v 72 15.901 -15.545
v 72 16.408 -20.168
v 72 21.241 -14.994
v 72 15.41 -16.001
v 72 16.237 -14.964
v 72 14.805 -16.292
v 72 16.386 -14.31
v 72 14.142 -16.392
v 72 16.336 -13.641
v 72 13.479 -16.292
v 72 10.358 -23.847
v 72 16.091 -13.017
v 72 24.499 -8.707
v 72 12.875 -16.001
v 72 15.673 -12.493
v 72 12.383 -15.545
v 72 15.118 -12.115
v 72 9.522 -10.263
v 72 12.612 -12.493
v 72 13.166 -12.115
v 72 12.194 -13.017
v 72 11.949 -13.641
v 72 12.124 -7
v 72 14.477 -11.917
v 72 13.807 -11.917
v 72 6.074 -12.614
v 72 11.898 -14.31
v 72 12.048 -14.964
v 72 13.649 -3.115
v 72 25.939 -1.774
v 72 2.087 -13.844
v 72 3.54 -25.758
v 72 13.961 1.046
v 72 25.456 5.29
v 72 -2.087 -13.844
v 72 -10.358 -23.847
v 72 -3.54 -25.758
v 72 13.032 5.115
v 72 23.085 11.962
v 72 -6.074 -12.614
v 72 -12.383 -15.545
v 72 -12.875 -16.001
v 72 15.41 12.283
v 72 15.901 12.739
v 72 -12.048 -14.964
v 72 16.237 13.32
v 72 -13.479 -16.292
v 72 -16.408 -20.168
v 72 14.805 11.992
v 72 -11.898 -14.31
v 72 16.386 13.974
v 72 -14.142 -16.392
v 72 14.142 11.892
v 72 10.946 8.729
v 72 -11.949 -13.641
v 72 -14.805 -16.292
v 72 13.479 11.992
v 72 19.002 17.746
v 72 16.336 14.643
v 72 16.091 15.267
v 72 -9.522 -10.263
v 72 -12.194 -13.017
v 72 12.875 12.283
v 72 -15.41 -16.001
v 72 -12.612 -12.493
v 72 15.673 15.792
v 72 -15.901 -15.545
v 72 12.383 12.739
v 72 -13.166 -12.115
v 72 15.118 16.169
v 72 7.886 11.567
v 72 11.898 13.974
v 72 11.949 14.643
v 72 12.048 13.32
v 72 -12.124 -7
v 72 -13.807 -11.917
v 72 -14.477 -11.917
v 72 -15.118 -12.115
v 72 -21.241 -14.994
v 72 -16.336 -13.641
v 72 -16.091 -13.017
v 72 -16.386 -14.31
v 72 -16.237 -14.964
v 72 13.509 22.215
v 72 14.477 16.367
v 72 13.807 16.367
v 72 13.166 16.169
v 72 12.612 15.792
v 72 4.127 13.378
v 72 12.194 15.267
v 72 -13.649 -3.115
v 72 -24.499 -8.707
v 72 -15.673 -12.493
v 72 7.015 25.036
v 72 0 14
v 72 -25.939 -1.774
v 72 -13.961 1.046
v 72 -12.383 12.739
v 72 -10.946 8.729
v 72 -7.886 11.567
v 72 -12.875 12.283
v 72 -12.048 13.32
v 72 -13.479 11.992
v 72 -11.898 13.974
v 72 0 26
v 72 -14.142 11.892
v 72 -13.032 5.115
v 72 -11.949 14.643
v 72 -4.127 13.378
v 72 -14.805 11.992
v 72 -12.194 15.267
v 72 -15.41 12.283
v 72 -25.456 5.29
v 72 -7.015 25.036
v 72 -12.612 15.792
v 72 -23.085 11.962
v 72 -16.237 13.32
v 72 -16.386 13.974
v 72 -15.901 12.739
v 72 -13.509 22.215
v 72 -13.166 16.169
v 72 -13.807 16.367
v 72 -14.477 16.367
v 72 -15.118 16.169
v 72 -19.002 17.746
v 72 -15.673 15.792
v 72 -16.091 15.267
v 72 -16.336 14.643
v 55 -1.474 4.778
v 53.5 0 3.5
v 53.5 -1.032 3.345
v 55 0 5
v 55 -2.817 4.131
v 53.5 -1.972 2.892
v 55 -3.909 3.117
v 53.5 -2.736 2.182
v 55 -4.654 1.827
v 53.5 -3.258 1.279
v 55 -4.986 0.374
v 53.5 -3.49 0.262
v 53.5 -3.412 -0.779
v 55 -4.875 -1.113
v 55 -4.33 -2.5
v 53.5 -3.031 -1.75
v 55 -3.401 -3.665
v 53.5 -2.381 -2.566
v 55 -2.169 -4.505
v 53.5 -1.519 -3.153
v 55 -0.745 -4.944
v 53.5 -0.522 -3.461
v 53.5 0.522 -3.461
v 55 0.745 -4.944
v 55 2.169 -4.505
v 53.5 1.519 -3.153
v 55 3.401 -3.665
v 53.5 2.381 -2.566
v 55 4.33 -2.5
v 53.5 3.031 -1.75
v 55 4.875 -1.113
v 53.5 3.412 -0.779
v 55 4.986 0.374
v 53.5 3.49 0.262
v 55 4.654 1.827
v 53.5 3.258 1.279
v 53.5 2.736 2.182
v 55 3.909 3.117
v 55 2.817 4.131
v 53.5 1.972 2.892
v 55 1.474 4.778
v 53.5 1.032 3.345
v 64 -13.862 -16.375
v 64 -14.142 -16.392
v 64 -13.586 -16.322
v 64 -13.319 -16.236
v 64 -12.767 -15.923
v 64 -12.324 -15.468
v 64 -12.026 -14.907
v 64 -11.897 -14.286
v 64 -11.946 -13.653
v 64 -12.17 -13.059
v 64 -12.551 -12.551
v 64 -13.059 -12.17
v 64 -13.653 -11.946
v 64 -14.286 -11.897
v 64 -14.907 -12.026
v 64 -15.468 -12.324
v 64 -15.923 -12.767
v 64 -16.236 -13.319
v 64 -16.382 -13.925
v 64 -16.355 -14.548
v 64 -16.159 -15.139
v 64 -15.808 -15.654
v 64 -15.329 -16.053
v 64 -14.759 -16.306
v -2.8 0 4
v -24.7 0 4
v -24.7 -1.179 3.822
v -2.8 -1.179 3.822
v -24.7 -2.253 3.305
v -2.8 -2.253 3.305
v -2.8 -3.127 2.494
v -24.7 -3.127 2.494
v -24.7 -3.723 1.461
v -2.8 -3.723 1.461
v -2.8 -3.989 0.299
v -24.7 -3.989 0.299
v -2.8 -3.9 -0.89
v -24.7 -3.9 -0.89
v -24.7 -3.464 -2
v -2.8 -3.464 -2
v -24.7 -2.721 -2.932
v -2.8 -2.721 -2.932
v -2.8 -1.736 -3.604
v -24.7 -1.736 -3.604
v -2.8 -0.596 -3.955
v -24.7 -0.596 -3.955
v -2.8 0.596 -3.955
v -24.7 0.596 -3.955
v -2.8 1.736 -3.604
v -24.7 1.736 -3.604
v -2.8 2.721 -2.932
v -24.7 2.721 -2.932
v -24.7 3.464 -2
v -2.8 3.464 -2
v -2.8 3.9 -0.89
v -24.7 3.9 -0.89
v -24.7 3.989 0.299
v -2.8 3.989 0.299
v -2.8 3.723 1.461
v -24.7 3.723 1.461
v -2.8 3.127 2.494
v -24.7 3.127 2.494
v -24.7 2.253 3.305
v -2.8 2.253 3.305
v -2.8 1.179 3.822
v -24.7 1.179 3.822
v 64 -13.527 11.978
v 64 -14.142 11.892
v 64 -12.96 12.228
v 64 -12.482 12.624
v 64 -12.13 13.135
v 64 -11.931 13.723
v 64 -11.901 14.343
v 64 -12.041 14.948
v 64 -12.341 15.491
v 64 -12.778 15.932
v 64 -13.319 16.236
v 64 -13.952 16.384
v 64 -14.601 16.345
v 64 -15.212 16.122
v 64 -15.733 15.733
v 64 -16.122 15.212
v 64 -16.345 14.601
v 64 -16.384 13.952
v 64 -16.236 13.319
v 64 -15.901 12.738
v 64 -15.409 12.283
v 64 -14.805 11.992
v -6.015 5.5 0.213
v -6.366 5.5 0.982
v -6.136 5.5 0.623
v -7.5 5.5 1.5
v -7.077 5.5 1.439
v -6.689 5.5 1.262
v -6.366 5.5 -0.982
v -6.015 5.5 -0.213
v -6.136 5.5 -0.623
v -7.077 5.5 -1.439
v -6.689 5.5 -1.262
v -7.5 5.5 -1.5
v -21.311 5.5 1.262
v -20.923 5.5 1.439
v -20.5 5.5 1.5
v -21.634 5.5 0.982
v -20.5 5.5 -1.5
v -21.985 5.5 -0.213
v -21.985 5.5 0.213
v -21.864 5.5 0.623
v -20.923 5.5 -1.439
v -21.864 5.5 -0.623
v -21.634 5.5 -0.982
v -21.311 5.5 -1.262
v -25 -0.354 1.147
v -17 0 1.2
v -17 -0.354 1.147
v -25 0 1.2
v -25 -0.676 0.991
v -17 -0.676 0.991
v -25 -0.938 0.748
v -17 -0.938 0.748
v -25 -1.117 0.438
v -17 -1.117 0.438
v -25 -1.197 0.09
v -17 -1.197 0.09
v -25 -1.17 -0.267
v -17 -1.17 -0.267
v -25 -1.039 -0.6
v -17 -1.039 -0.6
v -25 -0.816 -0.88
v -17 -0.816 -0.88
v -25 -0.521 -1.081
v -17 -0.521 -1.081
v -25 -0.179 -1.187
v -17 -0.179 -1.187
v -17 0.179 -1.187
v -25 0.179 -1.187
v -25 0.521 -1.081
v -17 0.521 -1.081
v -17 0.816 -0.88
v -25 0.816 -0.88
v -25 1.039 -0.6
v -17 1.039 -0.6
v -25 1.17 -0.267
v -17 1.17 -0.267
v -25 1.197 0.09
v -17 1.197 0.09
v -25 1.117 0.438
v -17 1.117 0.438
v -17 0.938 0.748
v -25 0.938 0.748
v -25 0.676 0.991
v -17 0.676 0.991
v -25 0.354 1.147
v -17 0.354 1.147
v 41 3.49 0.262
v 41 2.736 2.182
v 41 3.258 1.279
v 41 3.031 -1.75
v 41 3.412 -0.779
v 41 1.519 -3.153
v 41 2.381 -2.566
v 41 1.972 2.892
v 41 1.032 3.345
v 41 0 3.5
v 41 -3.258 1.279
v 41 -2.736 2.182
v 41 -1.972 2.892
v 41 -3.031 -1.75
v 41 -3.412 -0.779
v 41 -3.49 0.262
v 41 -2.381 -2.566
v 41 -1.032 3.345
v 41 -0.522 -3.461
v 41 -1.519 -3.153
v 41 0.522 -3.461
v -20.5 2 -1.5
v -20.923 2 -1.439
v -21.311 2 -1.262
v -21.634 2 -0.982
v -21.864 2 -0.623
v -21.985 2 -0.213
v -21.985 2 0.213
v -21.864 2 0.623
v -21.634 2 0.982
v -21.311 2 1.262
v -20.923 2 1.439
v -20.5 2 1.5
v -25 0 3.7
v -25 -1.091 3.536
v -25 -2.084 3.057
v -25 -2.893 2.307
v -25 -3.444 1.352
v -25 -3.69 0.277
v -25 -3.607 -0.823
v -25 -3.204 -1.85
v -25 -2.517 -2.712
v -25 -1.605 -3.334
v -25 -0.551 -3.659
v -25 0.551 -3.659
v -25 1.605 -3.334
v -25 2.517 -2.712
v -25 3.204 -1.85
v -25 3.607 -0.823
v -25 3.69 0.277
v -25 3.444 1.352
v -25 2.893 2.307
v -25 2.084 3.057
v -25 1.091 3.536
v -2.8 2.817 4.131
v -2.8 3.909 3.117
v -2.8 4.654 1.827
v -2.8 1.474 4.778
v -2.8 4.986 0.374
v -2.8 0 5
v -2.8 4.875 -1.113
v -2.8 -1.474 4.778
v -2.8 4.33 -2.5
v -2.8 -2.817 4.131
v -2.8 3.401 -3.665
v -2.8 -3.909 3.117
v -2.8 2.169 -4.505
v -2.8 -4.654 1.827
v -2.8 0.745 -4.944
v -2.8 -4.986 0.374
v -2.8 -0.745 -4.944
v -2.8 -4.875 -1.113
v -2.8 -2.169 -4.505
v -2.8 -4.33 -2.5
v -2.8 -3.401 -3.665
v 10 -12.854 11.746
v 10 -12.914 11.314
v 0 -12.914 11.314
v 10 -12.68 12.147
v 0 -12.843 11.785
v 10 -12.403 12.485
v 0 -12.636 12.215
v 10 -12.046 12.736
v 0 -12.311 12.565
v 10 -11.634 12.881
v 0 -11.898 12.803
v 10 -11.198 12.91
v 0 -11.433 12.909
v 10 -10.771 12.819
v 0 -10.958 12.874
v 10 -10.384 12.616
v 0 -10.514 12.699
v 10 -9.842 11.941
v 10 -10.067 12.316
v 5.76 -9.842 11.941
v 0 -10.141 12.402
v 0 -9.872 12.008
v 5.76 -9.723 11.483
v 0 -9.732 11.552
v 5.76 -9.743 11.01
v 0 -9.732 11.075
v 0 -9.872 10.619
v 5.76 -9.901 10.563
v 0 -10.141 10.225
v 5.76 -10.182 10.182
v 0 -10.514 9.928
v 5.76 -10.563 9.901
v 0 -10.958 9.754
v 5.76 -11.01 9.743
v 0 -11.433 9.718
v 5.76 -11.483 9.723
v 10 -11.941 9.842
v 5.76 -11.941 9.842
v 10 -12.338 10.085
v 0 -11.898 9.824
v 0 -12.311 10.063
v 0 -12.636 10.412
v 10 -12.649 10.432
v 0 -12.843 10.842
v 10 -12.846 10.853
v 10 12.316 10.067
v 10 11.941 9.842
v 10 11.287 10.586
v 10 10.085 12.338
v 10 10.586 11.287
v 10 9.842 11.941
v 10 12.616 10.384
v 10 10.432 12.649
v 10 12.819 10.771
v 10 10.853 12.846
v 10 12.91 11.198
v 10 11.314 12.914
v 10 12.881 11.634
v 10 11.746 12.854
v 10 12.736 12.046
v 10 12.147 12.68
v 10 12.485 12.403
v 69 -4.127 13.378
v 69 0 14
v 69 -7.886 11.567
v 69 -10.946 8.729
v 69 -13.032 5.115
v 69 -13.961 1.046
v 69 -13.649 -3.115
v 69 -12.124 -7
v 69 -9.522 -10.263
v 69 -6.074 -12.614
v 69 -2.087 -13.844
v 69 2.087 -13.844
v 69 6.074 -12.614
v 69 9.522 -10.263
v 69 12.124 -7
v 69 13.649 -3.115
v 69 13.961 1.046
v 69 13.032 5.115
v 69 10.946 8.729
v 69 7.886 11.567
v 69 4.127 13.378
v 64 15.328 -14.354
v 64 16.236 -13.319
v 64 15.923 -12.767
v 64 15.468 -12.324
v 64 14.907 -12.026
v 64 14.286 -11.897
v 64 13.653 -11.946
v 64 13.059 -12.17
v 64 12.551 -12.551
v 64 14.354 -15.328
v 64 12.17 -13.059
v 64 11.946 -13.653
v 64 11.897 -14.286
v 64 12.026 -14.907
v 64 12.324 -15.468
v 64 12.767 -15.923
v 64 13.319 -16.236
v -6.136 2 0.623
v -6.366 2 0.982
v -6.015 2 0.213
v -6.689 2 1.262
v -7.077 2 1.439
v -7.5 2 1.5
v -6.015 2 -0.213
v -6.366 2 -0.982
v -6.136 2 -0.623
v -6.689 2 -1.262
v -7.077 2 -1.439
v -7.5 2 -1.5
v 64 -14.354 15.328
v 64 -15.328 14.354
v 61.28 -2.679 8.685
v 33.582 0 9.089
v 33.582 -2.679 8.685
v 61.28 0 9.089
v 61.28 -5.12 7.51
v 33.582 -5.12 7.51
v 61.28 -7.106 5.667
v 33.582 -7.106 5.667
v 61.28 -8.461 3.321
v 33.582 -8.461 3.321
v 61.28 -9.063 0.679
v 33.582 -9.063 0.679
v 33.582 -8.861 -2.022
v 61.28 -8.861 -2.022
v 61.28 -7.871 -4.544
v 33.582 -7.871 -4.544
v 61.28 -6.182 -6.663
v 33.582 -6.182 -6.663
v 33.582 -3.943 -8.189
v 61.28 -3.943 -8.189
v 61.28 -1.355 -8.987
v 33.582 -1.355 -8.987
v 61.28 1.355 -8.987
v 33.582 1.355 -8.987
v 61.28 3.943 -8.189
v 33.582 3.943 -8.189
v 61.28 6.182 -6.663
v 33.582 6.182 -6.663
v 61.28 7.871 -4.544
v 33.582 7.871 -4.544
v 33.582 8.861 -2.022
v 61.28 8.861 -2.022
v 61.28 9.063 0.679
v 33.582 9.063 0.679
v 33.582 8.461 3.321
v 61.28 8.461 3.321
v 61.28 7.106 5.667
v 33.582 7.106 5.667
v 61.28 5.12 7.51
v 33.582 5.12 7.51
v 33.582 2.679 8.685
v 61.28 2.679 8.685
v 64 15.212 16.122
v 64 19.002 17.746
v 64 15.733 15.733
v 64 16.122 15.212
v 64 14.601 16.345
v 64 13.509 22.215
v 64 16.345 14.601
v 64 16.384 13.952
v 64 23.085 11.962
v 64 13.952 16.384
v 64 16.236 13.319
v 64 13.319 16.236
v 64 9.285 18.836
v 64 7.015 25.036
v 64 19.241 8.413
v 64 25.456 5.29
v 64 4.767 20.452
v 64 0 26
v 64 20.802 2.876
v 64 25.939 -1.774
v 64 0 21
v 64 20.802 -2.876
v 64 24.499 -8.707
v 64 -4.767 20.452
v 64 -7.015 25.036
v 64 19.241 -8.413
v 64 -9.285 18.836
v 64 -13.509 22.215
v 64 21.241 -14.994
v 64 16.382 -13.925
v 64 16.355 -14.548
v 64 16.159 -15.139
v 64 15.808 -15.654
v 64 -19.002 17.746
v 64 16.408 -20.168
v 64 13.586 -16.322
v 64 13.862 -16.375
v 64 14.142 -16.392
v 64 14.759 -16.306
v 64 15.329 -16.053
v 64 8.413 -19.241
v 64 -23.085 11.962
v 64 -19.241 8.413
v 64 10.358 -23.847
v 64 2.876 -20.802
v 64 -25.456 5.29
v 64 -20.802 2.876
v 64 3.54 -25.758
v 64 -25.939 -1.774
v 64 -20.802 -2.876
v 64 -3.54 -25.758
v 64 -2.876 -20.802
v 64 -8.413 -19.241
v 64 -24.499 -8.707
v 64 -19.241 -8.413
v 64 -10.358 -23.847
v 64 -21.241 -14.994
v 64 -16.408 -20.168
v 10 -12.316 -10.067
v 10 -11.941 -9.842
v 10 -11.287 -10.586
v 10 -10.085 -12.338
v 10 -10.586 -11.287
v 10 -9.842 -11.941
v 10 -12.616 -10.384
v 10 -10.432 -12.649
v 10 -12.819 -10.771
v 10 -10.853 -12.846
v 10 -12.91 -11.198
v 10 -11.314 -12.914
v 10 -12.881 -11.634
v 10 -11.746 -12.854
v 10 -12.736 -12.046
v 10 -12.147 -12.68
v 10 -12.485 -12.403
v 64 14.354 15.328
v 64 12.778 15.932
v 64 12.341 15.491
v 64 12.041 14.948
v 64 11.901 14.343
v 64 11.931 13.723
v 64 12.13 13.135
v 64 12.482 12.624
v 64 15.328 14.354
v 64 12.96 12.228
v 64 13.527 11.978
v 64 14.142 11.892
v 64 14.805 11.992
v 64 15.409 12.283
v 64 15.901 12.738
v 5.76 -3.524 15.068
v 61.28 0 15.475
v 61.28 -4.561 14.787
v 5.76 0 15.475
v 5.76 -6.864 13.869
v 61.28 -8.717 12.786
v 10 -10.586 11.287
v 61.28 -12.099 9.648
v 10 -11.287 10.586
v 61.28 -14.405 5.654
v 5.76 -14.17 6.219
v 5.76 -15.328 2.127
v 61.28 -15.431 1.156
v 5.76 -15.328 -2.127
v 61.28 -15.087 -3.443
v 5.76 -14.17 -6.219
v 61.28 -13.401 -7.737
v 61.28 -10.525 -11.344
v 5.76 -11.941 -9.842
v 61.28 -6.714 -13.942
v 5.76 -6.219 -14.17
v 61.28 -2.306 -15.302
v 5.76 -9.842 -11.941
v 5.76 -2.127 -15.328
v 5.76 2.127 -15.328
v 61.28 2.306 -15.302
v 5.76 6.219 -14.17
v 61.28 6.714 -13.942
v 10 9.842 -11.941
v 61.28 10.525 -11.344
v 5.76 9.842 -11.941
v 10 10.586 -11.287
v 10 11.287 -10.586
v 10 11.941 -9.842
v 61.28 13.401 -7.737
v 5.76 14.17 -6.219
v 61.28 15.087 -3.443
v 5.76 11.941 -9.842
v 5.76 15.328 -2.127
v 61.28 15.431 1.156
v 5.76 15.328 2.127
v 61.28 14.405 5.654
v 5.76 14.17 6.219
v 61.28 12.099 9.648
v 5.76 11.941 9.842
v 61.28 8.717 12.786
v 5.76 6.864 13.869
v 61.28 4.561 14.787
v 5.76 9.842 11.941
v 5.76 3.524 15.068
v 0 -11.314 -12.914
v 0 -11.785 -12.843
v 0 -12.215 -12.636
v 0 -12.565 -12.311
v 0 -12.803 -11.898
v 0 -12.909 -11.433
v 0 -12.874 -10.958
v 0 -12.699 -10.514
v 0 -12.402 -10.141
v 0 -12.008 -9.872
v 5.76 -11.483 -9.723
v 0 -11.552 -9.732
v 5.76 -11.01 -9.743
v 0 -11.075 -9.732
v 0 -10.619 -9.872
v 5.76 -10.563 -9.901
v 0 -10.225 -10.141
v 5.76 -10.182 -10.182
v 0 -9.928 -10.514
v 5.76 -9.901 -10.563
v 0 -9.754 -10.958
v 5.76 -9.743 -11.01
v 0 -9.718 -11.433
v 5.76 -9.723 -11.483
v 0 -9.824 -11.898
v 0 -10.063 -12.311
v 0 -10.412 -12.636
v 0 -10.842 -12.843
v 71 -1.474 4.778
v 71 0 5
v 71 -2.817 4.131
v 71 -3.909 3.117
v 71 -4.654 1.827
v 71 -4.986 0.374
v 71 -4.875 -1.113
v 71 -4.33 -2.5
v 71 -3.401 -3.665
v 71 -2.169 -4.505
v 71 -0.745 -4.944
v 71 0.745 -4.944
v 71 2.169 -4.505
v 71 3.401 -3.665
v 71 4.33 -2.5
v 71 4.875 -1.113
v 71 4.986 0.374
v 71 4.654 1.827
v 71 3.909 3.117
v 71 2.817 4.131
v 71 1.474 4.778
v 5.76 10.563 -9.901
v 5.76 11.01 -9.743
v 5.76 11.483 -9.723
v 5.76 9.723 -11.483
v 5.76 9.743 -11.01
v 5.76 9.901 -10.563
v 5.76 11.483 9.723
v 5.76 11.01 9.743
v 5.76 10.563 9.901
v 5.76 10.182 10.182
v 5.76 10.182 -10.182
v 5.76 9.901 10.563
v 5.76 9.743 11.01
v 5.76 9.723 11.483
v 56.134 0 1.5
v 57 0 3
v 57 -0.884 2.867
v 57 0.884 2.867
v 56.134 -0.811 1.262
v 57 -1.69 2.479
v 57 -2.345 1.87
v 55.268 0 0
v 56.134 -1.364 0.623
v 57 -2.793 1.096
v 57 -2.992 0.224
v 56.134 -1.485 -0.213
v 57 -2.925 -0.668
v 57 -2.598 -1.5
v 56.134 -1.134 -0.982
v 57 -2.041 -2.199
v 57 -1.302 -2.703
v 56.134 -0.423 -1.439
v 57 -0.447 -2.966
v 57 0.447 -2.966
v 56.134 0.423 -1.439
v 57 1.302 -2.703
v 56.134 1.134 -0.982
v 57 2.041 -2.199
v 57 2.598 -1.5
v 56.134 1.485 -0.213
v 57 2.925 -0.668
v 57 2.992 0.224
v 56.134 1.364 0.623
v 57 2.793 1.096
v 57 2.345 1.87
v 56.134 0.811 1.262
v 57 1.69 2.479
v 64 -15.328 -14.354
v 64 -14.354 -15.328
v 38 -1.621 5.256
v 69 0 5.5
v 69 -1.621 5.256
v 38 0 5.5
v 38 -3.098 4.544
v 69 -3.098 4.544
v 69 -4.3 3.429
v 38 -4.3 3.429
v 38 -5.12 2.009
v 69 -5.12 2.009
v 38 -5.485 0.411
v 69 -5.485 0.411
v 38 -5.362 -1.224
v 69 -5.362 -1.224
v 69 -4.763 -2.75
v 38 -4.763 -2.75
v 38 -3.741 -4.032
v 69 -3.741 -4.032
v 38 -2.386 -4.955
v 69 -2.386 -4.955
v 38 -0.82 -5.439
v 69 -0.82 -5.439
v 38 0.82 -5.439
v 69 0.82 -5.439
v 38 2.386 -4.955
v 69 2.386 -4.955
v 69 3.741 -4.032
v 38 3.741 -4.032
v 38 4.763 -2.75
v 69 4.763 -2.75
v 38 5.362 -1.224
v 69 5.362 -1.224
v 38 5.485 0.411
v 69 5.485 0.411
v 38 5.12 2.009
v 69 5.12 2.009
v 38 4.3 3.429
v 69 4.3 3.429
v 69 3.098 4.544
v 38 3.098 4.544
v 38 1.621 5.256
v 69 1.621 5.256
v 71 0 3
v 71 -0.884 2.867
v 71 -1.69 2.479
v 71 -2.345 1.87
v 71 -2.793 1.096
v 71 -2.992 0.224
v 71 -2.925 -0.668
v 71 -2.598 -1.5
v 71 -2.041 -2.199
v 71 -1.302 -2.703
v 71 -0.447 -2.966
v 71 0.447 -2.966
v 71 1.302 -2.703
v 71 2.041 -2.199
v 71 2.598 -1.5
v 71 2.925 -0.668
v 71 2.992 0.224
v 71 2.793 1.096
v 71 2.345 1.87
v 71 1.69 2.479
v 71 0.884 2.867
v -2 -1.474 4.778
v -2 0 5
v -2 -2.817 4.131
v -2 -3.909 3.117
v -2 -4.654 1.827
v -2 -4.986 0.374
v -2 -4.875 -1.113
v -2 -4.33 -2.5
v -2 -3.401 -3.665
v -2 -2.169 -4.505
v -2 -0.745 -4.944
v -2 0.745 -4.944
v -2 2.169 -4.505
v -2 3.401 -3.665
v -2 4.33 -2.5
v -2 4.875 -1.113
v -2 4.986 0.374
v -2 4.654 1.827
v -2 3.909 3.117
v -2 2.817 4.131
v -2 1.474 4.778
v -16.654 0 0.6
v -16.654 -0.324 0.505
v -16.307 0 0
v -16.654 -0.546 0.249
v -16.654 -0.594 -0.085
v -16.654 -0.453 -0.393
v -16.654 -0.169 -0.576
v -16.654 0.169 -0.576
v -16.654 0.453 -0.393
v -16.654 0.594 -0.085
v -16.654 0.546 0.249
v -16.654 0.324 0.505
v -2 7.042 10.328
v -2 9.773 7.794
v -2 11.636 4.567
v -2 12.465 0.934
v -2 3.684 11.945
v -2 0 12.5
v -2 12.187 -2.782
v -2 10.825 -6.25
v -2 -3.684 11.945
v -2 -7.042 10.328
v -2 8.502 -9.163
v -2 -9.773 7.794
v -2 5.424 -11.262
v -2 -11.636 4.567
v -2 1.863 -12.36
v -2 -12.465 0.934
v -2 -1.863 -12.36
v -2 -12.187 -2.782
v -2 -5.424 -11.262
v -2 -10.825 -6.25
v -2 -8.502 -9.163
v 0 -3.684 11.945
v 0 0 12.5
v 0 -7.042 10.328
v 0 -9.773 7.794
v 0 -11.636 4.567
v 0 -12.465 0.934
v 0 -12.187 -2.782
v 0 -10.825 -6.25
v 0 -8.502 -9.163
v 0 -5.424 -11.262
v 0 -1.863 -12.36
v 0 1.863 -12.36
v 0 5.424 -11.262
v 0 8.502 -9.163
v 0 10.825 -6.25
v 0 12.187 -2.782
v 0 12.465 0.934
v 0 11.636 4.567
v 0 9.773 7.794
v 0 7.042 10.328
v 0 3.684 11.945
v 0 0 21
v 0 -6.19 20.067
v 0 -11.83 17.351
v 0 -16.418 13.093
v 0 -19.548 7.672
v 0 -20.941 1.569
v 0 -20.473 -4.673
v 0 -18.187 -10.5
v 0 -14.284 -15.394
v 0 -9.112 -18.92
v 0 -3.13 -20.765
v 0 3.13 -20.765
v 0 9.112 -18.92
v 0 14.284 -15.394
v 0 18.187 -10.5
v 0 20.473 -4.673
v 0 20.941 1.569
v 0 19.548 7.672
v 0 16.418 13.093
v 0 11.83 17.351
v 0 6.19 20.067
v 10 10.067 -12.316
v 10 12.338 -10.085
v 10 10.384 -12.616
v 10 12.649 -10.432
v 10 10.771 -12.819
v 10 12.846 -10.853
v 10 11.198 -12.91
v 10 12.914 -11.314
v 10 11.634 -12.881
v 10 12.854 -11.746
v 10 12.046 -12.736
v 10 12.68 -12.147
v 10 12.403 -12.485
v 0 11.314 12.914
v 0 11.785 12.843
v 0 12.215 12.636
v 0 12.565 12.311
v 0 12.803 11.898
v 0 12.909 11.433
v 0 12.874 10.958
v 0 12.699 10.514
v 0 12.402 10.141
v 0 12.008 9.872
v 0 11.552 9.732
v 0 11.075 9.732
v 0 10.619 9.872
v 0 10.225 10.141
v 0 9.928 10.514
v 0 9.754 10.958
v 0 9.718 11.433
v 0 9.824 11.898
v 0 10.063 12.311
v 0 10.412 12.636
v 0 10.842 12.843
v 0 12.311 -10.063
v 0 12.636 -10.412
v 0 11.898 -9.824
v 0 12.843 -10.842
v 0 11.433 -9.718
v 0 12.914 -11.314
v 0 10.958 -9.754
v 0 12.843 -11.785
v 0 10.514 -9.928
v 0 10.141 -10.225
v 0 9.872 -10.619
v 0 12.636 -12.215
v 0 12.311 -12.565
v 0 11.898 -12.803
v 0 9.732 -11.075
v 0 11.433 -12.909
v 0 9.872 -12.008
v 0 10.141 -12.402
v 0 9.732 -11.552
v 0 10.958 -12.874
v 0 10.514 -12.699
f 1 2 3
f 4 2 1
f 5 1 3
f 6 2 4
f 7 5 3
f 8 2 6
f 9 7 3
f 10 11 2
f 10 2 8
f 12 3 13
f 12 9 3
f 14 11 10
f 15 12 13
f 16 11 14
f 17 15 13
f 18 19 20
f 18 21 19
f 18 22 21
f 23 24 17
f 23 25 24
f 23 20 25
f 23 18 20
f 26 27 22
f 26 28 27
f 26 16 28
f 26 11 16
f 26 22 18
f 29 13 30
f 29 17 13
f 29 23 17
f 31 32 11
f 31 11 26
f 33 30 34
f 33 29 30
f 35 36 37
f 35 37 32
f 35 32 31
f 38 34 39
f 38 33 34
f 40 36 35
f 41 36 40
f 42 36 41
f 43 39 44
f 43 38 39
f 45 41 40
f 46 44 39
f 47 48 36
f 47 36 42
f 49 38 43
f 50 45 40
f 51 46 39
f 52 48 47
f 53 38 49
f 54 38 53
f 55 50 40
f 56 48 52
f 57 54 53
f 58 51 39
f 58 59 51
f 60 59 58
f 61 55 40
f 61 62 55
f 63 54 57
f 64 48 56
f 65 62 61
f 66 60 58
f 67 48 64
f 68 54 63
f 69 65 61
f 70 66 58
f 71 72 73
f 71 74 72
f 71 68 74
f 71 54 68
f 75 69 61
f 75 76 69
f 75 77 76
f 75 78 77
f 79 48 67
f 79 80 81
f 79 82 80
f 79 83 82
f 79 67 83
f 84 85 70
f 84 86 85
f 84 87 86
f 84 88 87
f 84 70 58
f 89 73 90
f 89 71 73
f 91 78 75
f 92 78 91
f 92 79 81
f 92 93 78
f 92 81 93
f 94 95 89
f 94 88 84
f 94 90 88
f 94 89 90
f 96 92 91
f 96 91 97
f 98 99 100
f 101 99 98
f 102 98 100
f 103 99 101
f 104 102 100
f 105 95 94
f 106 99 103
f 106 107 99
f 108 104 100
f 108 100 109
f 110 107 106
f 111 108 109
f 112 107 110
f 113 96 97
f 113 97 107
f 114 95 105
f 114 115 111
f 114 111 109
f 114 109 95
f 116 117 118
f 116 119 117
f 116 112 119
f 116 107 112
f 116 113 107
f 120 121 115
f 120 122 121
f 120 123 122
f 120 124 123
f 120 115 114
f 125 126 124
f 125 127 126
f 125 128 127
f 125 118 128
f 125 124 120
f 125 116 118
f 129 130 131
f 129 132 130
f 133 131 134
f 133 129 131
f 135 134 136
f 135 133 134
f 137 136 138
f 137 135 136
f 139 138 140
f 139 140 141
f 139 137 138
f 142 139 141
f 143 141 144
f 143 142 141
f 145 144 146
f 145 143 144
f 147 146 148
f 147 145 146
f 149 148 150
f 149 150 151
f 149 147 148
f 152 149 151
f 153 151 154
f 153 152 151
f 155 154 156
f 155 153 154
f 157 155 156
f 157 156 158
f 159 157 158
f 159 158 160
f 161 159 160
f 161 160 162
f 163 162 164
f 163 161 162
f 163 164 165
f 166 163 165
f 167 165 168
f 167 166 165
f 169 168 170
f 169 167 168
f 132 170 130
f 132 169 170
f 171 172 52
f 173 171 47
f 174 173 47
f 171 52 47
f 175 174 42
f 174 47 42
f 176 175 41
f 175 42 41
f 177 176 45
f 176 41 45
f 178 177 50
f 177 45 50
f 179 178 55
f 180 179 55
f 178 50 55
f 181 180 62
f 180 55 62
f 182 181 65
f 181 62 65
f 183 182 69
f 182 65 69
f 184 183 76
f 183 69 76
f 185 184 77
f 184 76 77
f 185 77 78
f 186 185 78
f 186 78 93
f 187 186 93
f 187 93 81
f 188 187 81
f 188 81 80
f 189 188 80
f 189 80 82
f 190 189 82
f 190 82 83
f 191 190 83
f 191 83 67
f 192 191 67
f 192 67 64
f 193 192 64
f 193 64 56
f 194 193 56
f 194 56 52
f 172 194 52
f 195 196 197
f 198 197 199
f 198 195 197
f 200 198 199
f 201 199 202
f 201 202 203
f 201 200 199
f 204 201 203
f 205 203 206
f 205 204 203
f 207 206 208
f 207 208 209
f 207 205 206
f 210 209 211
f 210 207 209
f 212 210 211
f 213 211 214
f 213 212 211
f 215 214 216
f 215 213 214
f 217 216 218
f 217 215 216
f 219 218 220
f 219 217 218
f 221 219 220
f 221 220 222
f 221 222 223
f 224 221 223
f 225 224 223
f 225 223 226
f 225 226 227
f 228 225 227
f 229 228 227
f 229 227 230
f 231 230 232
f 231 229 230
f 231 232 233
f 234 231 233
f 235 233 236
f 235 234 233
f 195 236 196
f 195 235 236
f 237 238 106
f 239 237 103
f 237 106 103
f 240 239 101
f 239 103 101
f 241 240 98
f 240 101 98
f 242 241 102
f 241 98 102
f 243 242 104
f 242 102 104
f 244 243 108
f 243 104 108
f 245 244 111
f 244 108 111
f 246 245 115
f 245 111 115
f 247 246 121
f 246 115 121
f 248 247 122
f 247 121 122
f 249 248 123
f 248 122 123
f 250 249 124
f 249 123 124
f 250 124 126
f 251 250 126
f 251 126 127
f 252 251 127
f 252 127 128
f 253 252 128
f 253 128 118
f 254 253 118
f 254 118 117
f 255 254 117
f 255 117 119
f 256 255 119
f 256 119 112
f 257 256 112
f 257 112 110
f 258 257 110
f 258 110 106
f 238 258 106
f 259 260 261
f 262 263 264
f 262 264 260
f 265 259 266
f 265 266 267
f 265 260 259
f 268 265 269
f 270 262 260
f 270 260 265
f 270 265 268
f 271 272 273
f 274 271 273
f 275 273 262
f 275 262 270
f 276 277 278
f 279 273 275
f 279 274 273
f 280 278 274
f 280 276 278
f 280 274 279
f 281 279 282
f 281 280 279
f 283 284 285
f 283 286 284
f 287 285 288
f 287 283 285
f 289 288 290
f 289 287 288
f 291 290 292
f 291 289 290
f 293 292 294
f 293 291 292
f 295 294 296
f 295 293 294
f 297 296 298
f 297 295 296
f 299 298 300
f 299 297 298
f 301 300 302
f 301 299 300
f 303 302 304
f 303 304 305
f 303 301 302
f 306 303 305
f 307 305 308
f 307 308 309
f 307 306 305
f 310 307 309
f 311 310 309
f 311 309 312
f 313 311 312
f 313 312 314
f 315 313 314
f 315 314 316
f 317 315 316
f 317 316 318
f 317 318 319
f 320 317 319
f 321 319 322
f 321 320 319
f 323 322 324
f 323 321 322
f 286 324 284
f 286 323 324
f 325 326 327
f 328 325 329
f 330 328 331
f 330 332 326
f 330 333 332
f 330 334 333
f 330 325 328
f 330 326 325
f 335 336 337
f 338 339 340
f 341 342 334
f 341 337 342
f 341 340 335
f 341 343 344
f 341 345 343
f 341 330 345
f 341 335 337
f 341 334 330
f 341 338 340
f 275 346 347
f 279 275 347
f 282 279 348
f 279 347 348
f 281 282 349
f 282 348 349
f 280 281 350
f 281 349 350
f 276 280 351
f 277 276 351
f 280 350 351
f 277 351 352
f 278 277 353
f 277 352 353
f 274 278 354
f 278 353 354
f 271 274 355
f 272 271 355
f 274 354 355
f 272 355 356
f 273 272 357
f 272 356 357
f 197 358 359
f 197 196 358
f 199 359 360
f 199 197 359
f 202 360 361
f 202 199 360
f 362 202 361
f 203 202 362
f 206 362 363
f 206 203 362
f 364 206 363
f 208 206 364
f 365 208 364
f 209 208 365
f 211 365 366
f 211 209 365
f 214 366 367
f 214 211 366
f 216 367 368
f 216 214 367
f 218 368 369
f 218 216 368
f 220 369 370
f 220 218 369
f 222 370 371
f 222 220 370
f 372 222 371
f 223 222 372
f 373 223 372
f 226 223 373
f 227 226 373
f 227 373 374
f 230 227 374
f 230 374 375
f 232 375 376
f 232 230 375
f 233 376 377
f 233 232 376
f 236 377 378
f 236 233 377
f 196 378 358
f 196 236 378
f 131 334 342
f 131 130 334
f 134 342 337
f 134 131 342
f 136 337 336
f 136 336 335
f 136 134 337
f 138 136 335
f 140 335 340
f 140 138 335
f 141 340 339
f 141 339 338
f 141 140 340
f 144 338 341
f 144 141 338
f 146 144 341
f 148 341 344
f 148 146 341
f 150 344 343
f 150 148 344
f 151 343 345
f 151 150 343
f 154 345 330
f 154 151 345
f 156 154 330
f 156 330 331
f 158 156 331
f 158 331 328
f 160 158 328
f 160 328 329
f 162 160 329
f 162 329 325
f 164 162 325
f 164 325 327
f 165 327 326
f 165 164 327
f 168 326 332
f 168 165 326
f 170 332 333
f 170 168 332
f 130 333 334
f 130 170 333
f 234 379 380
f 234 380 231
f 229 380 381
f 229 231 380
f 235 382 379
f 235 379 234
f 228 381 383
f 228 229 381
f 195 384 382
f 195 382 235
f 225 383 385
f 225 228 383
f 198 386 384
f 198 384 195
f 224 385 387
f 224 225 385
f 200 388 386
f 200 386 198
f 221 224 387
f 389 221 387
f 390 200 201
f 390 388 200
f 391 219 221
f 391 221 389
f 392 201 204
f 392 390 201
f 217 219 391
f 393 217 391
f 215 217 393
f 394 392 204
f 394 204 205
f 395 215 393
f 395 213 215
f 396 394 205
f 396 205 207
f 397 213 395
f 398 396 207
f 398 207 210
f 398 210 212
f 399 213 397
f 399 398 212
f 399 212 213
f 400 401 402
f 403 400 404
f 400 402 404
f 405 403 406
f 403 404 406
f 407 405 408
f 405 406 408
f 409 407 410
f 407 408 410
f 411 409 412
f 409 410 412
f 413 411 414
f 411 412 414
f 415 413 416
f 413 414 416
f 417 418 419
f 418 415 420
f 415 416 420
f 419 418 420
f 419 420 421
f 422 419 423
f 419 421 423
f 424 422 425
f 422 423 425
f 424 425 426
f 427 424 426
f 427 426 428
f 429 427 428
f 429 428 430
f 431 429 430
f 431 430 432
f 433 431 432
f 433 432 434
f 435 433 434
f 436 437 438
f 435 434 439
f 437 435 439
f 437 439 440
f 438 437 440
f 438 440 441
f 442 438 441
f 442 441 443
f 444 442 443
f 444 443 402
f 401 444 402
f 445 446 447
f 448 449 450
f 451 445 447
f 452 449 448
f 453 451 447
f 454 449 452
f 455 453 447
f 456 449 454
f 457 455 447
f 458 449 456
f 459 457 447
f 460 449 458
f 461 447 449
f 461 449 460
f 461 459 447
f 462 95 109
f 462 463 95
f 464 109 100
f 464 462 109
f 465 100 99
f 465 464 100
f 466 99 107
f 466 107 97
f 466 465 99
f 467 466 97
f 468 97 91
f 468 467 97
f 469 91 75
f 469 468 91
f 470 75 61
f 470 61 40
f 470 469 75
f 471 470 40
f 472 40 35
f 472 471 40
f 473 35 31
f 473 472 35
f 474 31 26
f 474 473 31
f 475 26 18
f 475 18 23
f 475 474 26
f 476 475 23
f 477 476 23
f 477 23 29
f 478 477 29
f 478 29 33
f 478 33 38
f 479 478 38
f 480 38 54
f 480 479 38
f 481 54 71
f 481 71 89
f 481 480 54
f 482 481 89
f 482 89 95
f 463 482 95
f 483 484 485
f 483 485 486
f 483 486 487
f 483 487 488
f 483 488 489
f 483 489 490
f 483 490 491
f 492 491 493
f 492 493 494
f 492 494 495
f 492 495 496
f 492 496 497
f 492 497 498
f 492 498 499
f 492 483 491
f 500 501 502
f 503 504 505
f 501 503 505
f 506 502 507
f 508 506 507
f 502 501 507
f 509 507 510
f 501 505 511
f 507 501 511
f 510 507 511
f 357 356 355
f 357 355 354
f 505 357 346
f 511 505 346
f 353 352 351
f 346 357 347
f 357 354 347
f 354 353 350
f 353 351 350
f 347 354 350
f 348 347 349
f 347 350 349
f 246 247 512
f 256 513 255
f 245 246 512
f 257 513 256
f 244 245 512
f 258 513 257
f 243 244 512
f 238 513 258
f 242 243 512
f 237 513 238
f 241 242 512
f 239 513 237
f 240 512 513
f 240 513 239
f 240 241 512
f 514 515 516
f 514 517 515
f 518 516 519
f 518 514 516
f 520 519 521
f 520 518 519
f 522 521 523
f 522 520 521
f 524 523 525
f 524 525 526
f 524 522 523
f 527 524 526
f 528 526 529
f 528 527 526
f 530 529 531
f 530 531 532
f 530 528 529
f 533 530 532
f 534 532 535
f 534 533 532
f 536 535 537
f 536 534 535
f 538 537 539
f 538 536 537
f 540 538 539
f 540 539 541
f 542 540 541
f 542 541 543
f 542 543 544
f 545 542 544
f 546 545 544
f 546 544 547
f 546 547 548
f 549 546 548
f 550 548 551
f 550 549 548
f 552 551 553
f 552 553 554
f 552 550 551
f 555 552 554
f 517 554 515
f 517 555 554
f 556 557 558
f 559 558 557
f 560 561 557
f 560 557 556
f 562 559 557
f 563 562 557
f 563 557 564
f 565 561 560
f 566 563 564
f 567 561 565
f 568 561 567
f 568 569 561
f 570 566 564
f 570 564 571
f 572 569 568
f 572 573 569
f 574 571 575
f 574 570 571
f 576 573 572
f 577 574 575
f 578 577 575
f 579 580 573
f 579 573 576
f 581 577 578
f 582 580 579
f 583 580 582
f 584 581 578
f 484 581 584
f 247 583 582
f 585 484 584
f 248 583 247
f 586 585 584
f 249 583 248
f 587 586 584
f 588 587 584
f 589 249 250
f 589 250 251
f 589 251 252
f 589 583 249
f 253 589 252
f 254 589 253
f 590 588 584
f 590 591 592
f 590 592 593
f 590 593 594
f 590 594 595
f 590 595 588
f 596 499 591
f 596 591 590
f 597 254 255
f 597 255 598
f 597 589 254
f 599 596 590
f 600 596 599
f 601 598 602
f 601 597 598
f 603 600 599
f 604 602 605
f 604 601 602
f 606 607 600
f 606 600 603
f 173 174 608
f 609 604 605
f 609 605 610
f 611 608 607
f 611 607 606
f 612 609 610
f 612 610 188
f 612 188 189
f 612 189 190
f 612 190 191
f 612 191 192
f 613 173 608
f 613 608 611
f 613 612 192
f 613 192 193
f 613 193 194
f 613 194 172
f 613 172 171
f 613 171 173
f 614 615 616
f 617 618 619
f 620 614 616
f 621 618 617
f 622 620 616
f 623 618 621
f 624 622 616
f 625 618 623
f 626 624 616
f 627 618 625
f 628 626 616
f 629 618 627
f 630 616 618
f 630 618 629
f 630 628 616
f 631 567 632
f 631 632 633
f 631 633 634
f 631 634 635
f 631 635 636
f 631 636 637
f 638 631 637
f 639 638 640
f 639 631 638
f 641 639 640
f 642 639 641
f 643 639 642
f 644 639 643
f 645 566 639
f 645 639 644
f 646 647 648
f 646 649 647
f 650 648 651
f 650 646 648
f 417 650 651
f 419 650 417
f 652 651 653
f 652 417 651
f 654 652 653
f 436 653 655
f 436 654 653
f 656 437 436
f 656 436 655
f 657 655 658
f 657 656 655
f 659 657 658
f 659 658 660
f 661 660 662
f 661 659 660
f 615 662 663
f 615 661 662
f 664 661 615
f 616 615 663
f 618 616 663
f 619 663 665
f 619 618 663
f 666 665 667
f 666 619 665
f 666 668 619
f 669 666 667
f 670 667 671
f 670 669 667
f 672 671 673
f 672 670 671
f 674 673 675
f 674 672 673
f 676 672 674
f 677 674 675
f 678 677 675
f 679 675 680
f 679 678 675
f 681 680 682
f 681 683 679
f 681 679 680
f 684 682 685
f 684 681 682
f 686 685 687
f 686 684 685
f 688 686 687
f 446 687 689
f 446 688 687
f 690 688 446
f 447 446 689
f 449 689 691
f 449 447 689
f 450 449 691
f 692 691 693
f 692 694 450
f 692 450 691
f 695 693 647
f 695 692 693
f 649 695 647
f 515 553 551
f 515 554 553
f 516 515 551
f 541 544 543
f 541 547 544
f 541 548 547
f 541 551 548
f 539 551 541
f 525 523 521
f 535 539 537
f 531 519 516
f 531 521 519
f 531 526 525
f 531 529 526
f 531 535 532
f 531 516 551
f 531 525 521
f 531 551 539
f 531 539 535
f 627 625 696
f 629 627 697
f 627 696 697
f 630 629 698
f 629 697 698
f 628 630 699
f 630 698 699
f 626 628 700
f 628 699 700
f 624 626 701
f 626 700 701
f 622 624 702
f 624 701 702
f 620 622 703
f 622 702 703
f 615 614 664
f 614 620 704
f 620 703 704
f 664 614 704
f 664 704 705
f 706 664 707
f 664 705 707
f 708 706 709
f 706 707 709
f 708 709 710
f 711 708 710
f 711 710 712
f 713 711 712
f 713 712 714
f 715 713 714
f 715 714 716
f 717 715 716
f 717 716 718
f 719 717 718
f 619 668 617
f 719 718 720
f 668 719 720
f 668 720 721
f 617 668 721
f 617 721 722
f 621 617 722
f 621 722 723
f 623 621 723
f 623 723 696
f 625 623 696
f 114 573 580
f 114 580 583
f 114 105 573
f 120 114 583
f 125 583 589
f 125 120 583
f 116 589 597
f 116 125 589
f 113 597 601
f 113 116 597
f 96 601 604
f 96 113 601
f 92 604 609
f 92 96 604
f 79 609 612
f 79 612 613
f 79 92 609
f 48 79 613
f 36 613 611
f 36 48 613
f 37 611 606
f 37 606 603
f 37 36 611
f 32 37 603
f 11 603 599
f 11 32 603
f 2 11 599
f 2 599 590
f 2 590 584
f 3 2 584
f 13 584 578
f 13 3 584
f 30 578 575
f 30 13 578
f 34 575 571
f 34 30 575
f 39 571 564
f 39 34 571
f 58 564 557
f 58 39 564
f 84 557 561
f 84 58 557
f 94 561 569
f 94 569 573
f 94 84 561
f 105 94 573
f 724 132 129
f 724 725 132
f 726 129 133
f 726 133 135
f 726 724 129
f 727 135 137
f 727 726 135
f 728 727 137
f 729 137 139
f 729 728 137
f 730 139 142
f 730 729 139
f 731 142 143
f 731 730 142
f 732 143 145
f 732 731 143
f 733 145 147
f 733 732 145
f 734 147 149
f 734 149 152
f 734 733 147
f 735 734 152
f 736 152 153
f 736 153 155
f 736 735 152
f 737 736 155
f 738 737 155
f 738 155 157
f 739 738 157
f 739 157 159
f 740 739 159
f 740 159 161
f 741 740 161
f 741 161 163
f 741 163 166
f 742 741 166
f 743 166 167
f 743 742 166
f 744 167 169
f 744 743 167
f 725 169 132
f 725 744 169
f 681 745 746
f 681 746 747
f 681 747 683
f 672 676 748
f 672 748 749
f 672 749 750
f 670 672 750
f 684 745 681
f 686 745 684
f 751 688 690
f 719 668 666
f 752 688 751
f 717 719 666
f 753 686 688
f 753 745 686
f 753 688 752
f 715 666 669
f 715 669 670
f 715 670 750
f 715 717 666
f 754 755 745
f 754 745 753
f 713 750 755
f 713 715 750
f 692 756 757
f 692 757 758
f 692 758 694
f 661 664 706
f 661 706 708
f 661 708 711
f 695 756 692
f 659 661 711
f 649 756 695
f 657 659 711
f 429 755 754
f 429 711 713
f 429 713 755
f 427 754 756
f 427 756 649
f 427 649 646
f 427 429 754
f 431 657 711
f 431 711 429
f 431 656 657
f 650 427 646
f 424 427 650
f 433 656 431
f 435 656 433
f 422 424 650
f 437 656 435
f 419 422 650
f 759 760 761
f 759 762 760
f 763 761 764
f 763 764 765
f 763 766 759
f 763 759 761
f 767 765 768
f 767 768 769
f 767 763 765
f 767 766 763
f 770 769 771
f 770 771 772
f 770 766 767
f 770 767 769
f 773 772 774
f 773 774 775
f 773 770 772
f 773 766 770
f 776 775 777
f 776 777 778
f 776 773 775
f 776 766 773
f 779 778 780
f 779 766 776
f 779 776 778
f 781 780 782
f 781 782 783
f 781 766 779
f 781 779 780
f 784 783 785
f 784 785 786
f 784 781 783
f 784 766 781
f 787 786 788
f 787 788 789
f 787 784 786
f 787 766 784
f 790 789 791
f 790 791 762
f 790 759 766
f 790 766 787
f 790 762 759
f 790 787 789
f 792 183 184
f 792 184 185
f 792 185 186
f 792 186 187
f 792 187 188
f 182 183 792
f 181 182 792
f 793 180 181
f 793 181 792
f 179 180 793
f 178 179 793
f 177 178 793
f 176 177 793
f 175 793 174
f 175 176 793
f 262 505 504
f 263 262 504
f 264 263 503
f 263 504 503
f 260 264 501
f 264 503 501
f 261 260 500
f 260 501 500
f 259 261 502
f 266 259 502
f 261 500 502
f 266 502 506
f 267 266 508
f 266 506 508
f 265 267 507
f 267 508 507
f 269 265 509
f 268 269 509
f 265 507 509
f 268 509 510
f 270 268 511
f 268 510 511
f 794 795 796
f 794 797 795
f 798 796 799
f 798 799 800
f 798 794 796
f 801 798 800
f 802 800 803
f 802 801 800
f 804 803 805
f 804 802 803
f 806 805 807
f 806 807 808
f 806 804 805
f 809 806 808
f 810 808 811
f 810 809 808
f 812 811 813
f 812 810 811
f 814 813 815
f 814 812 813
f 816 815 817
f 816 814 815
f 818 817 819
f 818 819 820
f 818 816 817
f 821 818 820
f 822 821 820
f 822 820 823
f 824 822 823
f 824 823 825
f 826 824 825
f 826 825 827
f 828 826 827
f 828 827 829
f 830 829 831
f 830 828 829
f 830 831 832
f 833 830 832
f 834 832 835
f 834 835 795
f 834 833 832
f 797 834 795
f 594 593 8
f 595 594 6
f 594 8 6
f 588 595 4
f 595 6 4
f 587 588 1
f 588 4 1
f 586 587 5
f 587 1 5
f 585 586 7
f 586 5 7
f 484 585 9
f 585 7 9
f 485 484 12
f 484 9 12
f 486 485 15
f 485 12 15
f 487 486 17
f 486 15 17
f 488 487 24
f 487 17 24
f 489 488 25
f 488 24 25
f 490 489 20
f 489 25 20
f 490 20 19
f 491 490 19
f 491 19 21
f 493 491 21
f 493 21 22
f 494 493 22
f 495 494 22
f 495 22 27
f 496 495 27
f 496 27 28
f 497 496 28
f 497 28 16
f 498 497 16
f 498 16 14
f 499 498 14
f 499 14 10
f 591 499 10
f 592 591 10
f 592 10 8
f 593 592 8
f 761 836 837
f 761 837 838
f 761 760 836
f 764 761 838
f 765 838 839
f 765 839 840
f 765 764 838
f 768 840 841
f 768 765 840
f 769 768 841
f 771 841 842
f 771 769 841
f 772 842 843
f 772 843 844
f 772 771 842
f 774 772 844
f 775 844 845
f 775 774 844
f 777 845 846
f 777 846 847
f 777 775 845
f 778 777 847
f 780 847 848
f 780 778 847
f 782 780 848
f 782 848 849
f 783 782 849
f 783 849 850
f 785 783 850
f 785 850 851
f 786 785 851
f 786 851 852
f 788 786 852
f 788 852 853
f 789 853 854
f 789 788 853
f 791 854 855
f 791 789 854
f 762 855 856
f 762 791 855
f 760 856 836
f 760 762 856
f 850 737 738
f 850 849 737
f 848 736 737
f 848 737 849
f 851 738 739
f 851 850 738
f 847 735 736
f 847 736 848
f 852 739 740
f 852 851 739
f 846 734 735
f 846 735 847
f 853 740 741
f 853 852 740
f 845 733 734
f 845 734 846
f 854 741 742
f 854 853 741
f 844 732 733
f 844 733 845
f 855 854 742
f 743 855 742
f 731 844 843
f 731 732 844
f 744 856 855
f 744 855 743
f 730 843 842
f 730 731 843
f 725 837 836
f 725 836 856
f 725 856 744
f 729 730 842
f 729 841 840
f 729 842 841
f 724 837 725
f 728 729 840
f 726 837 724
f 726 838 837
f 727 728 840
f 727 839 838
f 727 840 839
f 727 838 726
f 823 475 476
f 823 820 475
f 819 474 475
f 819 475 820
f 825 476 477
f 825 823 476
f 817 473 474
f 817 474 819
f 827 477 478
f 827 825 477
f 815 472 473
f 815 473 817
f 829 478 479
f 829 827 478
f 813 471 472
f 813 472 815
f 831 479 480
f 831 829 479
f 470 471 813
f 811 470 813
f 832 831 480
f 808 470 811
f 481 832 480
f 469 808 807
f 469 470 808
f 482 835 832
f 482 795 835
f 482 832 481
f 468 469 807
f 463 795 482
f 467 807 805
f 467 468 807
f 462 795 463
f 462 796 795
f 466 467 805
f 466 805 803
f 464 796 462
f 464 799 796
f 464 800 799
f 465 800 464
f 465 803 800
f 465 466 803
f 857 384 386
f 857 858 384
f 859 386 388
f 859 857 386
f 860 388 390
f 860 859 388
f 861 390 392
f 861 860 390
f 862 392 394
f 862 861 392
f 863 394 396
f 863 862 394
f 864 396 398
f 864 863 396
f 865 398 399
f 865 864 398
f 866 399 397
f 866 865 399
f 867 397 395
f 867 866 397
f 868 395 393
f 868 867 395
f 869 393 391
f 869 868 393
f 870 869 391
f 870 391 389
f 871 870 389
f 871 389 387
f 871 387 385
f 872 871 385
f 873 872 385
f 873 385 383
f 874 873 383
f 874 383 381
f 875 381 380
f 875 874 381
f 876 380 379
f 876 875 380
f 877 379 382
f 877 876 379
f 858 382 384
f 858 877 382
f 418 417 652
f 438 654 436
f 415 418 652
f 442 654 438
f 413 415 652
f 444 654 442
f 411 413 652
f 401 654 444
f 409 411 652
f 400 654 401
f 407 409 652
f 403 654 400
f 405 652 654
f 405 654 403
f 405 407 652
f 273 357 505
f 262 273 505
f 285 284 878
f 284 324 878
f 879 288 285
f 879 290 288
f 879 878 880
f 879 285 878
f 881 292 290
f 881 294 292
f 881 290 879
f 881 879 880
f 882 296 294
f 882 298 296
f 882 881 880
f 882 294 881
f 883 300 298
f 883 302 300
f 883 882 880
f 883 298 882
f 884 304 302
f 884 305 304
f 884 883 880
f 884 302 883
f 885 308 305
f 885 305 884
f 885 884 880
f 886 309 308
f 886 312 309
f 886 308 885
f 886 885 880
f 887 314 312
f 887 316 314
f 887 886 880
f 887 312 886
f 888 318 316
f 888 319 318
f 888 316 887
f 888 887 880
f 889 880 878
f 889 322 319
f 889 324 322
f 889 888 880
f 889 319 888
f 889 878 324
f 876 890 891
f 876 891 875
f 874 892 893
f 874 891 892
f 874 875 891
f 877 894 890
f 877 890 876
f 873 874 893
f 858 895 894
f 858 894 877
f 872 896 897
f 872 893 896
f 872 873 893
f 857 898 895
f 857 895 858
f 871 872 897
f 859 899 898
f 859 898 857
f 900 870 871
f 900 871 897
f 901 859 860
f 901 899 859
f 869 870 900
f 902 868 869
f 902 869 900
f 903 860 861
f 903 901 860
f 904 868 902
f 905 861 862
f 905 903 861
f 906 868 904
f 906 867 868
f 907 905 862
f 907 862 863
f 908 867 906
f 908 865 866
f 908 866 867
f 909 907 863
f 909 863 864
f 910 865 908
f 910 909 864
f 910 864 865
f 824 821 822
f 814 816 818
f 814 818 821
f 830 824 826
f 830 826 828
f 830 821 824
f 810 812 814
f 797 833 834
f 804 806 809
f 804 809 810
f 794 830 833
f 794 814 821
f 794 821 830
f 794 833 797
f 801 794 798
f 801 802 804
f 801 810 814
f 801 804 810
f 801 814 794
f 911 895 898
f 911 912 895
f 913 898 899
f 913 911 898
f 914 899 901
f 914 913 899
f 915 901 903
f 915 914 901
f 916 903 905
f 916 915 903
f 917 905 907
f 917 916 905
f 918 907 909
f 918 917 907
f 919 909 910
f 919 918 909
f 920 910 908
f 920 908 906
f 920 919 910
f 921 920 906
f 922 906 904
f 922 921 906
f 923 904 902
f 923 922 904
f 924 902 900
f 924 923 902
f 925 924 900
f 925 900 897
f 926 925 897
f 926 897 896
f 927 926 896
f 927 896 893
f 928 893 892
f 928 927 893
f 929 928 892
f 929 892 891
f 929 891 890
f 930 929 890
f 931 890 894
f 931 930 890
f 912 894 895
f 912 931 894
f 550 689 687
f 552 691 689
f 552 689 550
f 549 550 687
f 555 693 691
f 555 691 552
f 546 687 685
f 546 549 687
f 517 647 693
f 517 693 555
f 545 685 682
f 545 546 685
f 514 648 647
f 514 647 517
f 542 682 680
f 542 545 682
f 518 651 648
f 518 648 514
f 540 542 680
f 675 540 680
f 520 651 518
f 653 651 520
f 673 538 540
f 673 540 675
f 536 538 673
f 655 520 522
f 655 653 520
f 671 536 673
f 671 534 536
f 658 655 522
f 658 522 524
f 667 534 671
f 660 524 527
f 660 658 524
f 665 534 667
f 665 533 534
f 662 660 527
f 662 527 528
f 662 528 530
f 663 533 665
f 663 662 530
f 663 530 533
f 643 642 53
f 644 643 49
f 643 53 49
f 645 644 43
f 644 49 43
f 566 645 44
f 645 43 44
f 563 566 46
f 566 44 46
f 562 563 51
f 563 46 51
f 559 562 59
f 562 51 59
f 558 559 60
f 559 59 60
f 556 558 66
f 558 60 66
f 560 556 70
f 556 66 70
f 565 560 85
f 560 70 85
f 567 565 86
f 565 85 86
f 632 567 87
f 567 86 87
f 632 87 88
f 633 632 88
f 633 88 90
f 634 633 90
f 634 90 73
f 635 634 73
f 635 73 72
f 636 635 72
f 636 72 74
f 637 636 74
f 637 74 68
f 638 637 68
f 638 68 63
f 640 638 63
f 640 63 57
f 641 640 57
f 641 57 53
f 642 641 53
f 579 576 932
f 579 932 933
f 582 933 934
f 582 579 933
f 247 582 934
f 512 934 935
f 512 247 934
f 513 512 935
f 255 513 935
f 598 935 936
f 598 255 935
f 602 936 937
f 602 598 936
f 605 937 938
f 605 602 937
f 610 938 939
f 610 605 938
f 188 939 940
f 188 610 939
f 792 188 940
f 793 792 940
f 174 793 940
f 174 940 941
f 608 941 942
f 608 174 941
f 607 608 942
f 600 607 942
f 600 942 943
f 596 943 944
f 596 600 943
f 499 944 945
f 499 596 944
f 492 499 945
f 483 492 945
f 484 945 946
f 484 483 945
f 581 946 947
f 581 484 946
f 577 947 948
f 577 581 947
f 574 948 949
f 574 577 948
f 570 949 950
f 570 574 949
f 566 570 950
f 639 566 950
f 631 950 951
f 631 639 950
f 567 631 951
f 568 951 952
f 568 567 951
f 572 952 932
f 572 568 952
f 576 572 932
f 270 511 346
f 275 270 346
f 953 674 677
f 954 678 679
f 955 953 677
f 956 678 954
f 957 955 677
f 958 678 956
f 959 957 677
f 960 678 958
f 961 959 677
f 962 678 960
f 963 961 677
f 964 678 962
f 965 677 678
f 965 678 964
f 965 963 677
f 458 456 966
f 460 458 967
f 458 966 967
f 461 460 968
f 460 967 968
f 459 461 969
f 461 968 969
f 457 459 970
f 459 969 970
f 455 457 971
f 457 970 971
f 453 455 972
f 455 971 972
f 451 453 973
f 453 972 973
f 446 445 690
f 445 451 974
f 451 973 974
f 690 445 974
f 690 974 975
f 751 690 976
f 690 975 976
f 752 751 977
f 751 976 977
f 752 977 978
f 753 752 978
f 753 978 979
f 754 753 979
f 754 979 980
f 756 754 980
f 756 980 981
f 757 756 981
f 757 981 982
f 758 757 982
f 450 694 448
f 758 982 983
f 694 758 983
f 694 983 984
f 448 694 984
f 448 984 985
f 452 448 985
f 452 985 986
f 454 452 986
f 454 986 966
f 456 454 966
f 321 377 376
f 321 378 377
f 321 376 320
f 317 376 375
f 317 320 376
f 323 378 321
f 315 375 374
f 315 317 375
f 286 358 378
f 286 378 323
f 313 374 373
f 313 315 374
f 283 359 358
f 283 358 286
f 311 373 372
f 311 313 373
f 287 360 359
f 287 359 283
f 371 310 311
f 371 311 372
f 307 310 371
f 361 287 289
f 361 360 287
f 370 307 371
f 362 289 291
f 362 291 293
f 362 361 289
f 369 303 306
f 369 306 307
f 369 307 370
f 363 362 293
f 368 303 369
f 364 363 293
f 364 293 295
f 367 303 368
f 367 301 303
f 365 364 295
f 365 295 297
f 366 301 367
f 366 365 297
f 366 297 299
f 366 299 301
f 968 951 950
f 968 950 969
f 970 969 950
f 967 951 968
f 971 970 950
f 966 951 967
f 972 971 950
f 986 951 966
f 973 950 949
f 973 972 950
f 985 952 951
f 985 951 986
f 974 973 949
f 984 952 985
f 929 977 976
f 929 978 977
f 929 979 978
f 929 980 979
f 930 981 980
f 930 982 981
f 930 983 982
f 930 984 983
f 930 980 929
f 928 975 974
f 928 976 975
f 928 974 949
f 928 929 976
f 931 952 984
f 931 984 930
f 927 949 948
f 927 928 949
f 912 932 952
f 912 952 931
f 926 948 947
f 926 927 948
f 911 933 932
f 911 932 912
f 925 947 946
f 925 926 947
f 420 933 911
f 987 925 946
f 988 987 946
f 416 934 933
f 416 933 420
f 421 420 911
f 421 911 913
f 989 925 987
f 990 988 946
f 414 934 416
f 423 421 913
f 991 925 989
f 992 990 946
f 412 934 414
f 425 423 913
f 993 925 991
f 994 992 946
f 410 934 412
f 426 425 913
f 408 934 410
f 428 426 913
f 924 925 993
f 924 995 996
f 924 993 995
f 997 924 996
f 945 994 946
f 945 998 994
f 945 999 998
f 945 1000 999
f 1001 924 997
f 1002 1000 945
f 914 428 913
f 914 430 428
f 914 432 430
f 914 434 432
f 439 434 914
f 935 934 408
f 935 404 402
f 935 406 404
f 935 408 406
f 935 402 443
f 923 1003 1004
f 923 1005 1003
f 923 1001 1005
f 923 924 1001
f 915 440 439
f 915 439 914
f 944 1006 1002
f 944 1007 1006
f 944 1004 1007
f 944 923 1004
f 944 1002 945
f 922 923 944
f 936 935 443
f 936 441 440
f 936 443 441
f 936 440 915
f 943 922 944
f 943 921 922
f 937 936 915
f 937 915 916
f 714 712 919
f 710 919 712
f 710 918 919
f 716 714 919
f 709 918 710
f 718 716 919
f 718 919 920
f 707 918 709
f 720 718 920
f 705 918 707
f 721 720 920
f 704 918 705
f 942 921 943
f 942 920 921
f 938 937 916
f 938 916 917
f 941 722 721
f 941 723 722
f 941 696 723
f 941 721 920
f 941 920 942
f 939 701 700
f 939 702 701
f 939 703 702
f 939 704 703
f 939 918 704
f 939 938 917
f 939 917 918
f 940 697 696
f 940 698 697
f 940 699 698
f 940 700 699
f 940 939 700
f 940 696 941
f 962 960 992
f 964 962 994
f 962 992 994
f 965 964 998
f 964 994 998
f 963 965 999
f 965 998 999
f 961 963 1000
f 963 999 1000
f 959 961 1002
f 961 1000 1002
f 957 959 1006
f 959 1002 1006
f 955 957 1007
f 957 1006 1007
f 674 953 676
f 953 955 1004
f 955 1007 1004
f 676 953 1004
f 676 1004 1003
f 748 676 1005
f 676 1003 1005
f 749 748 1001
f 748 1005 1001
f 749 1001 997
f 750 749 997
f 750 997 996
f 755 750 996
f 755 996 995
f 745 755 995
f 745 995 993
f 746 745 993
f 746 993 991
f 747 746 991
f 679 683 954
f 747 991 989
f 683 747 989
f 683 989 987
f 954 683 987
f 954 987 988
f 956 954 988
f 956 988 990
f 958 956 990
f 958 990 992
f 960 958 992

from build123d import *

# Parameters (mm, degrees)
VYSUNOUT1_DEPTH          = 1.5
VYSUNOUT1_DEPTH_BACK     = 2
SKICA4_R                 = 1.6
ODEBRAT_VYSUNUT_M1_DEPTH = 10
KRUHOV_POLE1_COUNT       = 4
SKICA5_R                 = 2.25
ODEBRAT_VYSUNUT_M2_DEPTH = 8


with BuildPart() as part:
    # Skica1 → Rotovat1 (revolve)
    with BuildSketch(Plane.XY, mode=Mode.PRIVATE) as rotovat1_sk:
        Polygon((-25, 1.2), (-25, 3.7), (-24.7, 4), (-2.8, 4), (-2.8, 5), (-2, 5), (-2, 12.5), (0, 12.5), (0, 21), (64, 21), (64, 26), (72, 26), (72, 14), (69, 14), (69, 5.5), (38, 5.5), (38, 0), (33.582268589, 0), (33.582268589, 9.088819243), (61.279825372, 9.088819243), (61.279825372, 15.474623239), (5.76022676, 15.474623239), (5.76022676, 0), (-16.307179677, 0), (-17, 1.2), align=None)
    revolve(rotovat1_sk.sketch.rotate(Axis((-80.036458333, 0, 0), (1, 0, 0)), 90), axis=Axis((-80.036458333, 0, 0), (1, 0, 0)))

    # Skica4 → Odebrat vysunutím1 (cut)
    with BuildSketch(Plane.ZY):
        with Locations((11.313708499, 11.313708499)):
            Circle(SKICA4_R)
    odebrat_vysunut_m1 = extrude(amount=-ODEBRAT_VYSUNUT_M1_DEPTH, mode=Mode.SUBTRACT)

    # Kruhové pole1: Odebrat vysunutím1 ×4 about axis
    kruhov_pole1_axis = Axis((0, 0, 0), (1, 0, 0))
    for i in range(1, KRUHOV_POLE1_COUNT):
        add(odebrat_vysunut_m1.rotate(kruhov_pole1_axis, i * 360 / KRUHOV_POLE1_COUNT), mode=Mode.SUBTRACT)

    # Skica5 → Odebrat vysunutím2 (cut)
    with BuildSketch(Plane(origin=(72, 0, 0), x_dir=(0, 0, -1), z_dir=(1, 0, 0))):
        with Locations((14.142135624, 14.142135624)):
            Circle(SKICA5_R)
        with Locations((14.142135624, -14.142135624)):
            Circle(SKICA5_R)
        with Locations((-14.142135624, -14.142135624)):
            Circle(SKICA5_R)
        with Locations((-14.142135624, 14.142135624)):
            Circle(SKICA5_R)
    extrude(amount=-ODEBRAT_VYSUNUT_M2_DEPTH, mode=Mode.SUBTRACT)


with BuildPart() as body_2:
    # Skica2 → Rotovat2 (revolve)
    with BuildSketch(Plane.XY, mode=Mode.PRIVATE) as rotovat2_sk:
        Polygon((41, 0), (41, 3.5), (53.5, 3.5), (55, 5), (71, 5), (71, 3), (57, 3), (55.267949192, 0), align=None)
    revolve(rotovat2_sk.sketch.rotate(Axis((0, 0, 0), (1, 0, 0)), 90), axis=Axis((0, 0, 0), (1, 0, 0)))


with BuildPart() as body_3:
    # Skica3 → Vysunout1 (new, two sides: drawn at the far end of the back side and taken through both)
    with BuildSketch(Plane(origin=(-13.75, 4, 0), x_dir=(0, 0, -1), z_dir=(0, 1, 0)).offset(-VYSUNOUT1_DEPTH_BACK)):
        with BuildLine():
            Line((1.5, -6.25), (1.5, 6.75))
            ThreePointArc((1.5, 6.75), (0, 8.25), (-1.5, 6.75))
            Line((-1.5, 6.75), (-1.5, -6.25))
            ThreePointArc((-1.5, -6.25), (0, -7.75), (1.5, -6.25))
        make_face()
    extrude(amount=VYSUNOUT1_DEPTH + VYSUNOUT1_DEPTH_BACK)


solid = Compound([part.part, body_2.part, body_3.part])
